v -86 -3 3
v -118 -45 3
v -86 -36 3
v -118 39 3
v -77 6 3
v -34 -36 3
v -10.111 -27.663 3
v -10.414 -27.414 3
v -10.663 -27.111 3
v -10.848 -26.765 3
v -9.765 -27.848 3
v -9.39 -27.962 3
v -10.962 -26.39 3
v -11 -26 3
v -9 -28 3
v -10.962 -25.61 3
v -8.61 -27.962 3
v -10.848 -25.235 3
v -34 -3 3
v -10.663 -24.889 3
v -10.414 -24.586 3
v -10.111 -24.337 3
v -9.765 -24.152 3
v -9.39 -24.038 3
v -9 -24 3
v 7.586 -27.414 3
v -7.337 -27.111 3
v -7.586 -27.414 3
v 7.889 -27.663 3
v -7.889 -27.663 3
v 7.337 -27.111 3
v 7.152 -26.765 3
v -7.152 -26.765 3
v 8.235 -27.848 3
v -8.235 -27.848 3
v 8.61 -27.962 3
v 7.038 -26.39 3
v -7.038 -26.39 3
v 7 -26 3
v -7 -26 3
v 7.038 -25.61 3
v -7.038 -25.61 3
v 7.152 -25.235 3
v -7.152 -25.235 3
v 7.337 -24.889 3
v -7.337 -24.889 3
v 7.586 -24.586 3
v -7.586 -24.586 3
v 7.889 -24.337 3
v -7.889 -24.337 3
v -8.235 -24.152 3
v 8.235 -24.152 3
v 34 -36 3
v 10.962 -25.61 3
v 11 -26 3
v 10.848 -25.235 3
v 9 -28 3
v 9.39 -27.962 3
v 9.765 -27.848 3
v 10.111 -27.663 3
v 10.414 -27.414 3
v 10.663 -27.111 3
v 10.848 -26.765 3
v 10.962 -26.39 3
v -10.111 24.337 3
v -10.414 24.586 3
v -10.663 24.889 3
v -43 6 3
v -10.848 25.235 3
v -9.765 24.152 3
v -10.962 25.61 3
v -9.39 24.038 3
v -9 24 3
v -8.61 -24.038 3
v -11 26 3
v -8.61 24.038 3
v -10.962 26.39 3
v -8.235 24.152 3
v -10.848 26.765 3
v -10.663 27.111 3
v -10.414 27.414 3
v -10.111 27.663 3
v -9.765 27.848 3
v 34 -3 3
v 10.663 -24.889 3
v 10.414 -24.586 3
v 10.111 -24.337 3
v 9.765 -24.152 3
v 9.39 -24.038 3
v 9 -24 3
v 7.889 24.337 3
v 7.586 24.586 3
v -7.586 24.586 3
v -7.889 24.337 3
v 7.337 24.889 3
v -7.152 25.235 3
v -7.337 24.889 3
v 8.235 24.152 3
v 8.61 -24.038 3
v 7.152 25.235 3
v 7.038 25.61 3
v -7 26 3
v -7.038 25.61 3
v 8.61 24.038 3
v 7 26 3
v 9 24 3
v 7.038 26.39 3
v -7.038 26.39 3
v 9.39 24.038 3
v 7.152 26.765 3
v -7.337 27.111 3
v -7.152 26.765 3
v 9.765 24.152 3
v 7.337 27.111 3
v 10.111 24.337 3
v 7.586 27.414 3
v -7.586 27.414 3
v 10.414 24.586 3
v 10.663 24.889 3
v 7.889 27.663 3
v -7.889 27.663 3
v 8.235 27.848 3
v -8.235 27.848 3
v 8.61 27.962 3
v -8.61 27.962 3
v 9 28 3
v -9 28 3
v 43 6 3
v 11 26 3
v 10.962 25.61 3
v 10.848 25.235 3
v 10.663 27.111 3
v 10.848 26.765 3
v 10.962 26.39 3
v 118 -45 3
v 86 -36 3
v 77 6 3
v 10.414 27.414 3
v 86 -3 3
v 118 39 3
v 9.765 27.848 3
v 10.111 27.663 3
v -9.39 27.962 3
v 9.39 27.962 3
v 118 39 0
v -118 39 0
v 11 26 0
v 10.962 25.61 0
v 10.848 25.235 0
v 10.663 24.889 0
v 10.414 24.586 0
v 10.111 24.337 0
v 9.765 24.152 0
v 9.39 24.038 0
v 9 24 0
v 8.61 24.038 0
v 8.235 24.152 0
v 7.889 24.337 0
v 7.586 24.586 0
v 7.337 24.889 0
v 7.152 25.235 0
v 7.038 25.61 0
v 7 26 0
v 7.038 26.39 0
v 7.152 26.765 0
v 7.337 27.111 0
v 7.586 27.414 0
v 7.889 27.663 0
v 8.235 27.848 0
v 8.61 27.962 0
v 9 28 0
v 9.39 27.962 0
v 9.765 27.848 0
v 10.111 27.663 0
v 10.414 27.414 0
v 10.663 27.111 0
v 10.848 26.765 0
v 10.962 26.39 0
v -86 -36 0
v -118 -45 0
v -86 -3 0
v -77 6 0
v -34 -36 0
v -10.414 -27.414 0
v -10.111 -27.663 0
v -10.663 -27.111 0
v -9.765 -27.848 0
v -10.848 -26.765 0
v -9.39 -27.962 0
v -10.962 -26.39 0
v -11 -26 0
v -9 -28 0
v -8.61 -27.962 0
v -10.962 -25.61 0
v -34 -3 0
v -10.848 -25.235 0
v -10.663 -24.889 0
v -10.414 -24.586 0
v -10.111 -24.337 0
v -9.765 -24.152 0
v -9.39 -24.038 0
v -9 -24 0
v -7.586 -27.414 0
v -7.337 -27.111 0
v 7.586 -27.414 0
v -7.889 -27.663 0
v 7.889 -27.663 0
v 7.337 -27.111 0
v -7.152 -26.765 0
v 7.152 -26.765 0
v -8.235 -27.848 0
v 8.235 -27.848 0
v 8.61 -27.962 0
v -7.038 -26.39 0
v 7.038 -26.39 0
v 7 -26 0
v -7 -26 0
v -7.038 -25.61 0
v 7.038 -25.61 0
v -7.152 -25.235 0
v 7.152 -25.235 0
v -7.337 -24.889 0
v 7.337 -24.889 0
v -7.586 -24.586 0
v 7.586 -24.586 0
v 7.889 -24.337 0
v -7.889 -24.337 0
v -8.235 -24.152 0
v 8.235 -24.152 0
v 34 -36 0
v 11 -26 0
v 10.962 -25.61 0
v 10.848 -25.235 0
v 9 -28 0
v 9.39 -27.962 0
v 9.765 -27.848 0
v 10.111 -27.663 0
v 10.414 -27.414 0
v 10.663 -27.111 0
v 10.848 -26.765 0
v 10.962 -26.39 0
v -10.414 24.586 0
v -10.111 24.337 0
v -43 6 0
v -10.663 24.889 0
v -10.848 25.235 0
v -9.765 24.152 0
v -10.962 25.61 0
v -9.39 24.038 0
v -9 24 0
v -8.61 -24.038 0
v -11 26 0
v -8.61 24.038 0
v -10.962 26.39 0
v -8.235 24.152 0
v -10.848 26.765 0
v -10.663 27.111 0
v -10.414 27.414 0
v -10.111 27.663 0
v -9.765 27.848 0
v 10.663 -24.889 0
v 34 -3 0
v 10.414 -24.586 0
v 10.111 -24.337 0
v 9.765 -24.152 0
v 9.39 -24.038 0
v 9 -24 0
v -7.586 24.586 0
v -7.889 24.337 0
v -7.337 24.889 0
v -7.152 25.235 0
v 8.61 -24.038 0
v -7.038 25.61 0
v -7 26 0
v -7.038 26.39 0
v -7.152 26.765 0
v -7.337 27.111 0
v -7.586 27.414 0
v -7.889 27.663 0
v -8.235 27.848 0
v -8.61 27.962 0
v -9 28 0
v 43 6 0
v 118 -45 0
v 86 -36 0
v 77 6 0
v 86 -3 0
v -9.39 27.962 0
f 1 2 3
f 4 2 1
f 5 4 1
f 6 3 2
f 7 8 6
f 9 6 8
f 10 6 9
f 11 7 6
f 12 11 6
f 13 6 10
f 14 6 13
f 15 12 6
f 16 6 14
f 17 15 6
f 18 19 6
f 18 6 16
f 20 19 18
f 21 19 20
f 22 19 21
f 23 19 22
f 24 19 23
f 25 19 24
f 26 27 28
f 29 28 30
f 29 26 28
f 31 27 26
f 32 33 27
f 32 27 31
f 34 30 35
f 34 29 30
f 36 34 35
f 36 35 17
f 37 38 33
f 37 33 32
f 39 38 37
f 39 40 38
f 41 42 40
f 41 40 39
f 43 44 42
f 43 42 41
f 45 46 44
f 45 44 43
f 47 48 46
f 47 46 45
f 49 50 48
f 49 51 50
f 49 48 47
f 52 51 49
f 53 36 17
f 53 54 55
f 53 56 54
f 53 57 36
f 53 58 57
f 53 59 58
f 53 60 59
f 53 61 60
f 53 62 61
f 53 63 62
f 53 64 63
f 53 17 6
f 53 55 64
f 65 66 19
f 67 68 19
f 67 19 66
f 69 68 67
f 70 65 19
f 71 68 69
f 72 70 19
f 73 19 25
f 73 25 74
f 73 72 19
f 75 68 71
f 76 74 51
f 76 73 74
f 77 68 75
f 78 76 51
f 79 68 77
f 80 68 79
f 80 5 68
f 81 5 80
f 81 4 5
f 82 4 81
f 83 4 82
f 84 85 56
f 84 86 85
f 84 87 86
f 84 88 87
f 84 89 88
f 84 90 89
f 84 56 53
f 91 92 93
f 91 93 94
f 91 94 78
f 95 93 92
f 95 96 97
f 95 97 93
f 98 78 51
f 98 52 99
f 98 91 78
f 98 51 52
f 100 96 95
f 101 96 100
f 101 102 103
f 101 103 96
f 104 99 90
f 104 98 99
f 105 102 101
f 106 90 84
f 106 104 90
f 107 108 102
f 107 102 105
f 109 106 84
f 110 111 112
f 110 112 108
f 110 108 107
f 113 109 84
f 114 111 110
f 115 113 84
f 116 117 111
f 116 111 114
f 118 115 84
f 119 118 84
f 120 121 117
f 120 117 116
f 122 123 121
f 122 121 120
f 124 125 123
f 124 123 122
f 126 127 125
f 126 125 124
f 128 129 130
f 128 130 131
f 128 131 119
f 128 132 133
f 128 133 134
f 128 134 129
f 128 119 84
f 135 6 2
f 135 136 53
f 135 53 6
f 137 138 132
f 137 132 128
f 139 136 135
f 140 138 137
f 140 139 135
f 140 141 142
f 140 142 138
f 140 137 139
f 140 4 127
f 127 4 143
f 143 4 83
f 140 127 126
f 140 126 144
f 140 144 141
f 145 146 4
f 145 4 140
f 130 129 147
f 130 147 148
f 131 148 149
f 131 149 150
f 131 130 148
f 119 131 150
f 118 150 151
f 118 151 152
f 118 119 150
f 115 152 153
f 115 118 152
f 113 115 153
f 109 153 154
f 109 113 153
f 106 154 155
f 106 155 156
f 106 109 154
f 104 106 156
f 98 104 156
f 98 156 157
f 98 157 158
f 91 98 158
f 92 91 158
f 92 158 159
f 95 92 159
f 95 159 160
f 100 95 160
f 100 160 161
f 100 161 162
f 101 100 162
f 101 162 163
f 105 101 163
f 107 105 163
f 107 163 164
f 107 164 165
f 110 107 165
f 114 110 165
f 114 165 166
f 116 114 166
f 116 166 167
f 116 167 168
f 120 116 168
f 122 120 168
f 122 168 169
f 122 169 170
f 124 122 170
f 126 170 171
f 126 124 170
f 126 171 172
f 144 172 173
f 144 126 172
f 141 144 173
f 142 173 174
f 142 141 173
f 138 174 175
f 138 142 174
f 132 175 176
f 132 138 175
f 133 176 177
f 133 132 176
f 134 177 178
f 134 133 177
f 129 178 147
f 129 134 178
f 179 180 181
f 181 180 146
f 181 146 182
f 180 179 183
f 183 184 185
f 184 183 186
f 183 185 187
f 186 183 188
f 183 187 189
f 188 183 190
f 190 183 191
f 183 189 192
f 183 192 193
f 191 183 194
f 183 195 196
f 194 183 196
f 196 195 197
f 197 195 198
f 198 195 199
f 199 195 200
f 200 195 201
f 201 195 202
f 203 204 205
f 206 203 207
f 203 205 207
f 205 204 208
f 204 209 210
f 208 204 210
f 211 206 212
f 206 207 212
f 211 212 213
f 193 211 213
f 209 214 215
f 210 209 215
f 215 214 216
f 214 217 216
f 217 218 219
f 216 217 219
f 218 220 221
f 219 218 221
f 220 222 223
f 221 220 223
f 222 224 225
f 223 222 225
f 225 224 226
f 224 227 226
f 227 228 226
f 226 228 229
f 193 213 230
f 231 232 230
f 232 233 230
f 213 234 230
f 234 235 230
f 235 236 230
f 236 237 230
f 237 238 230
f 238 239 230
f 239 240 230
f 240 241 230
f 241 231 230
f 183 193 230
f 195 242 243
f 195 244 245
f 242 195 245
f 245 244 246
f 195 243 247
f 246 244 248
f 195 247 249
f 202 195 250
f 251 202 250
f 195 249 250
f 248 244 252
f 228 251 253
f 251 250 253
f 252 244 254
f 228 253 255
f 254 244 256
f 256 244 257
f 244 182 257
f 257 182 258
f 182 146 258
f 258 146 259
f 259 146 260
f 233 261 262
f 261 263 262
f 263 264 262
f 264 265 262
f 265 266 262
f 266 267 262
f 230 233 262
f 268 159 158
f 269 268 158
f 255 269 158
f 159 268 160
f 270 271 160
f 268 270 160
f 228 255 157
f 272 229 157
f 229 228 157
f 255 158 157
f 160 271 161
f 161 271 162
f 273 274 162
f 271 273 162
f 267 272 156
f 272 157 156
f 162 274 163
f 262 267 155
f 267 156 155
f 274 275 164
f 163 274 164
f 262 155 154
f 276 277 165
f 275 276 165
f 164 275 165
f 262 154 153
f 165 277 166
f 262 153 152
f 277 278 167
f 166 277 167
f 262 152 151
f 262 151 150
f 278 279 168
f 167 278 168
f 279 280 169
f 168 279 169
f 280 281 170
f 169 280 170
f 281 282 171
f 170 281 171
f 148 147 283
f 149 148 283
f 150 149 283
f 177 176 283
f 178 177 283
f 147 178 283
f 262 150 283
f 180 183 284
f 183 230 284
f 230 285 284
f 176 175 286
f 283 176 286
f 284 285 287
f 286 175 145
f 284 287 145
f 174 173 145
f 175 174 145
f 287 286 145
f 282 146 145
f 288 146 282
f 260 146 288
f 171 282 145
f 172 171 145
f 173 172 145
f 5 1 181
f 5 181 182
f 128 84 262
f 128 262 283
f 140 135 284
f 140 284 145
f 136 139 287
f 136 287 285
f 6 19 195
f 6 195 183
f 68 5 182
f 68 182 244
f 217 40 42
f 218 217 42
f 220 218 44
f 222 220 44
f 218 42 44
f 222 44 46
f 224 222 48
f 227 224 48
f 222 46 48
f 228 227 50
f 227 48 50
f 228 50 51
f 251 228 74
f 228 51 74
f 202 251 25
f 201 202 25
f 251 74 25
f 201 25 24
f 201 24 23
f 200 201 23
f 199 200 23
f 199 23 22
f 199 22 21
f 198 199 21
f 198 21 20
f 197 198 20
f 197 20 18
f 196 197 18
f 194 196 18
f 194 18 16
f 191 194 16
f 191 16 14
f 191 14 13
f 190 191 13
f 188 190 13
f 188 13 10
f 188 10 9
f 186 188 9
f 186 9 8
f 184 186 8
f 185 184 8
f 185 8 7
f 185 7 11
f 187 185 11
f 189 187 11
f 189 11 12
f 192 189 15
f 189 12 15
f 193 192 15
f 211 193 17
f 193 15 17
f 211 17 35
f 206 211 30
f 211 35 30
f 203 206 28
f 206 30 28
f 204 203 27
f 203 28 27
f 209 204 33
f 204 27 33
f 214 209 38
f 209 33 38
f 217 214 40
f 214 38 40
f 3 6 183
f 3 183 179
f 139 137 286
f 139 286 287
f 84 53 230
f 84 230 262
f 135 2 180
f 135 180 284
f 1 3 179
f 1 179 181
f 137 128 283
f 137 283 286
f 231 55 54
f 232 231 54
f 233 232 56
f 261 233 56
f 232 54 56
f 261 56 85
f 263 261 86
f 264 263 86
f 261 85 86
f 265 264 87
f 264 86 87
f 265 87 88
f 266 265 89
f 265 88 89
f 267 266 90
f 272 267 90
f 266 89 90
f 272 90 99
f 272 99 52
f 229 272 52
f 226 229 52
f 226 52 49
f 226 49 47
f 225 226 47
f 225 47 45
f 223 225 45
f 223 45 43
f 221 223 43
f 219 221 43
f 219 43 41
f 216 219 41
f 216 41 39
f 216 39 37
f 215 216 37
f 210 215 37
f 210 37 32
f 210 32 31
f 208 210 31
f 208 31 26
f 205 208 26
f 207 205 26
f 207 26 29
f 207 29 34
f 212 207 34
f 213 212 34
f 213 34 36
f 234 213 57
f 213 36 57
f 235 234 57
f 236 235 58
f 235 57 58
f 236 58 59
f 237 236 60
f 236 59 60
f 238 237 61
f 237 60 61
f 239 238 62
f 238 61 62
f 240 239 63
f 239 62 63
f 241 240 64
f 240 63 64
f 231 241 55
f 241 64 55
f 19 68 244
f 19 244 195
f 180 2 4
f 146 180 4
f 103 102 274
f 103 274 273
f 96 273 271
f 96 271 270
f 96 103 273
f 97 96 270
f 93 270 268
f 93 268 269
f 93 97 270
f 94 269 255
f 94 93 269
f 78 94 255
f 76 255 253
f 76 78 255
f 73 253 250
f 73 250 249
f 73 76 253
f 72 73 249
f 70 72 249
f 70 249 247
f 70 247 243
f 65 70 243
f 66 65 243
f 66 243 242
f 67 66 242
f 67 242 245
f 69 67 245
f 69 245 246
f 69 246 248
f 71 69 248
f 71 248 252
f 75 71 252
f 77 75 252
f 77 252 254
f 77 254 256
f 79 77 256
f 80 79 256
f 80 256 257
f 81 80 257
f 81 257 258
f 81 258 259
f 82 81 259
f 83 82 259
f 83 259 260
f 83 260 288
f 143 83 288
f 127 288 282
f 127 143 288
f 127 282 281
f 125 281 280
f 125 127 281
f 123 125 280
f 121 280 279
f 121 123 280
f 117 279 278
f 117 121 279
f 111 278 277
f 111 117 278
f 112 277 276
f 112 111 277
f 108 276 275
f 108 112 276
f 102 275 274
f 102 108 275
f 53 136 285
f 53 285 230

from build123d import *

# Parameters (mm, degrees)
ESQUISSE1_W             = 236
ESQUISSE1_H             = 78
BOSS_EXTRU_1_DEPTH      = 3
ENL_V_MAT_EXTRU_1_REACH = 126.314
ESQUISSE2_R             = 2
ESQUISSE3_W             = 236
ESQUISSE3_H             = 6
BOSS_EXTRU_2_DEPTH      = 3
ENL_V_MAT_EXTRU_2_REACH = 128.325


with BuildPart() as part:
    # Esquisse1 → Boss.-Extru.1 (new body)
    with BuildSketch(Plane.XY):
        Rectangle(ESQUISSE1_W, ESQUISSE1_H)
    extrude(amount=BOSS_EXTRU_1_DEPTH)

    # Esquisse2 → Enlèv. mat.-Extru.1 (cut, up to next)
    with BuildSketch(Plane.XY.offset(3), mode=Mode.PRIVATE) as enl_v_mat_extru_1_sk1:
        with Locations((9, -26)):
            Circle(ESQUISSE2_R)
    enl_v_mat_extru_1_tool1 = extrude(enl_v_mat_extru_1_sk1.sketch, amount=-ENL_V_MAT_EXTRU_1_REACH, mode=Mode.PRIVATE) & part.part
    # Esquisse2 → Enlèv. mat.-Extru.1 (cut, up to next)
    with BuildSketch(Plane.XY.offset(3), mode=Mode.PRIVATE) as enl_v_mat_extru_1_sk2:
        with Locations((-9, -26)):
            Circle(ESQUISSE2_R)
    enl_v_mat_extru_1_tool2 = extrude(enl_v_mat_extru_1_sk2.sketch, amount=-ENL_V_MAT_EXTRU_1_REACH, mode=Mode.PRIVATE) & part.part
    enl_v_mat_extru_1_1 = enl_v_mat_extru_1_tool1.solids().sort_by_distance((9, -26, 3))[0]
    add(enl_v_mat_extru_1_1, mode=Mode.SUBTRACT)
    enl_v_mat_extru_1_2 = enl_v_mat_extru_1_tool2.solids().sort_by_distance((-9, -26, 3))[0]
    add(enl_v_mat_extru_1_2, mode=Mode.SUBTRACT)
    enl_v_mat_extru_1 = enl_v_mat_extru_1_1 + enl_v_mat_extru_1_2  # Enlèv. mat.-Extru.1 as one shape, for the pattern or mirror that repeats it

    # Symétrie1: Enlèv. mat.-Extru.1 across plane
    add(enl_v_mat_extru_1.mirror(Plane.ZX), mode=Mode.SUBTRACT)

    # Esquisse3 → Boss.-Extru.2 (add)
    with BuildSketch(Plane.XY.offset(3)):
        with Locations((0, -42)):
            Rectangle(ESQUISSE3_W, ESQUISSE3_H)
    extrude(amount=-BOSS_EXTRU_2_DEPTH)

    # Esquisse4 → Enlèv. mat.-Extru.2 (cut, up to next)
    with BuildSketch(Plane.XY.offset(3), mode=Mode.PRIVATE) as enl_v_mat_extru_2_sk1:
        Polygon((34, -36), (34, -3), (43, 6), (77, 6), (86, -3), (86, -36), align=None)
    enl_v_mat_extru_2_tool1 = extrude(enl_v_mat_extru_2_sk1.sketch, amount=-ENL_V_MAT_EXTRU_2_REACH, mode=Mode.PRIVATE) & part.part
    # Esquisse4 → Enlèv. mat.-Extru.2 (cut, up to next)
    with BuildSketch(Plane.XY.offset(3), mode=Mode.PRIVATE) as enl_v_mat_extru_2_sk2:
        Polygon((-86, -3), (-77, 6), (-43, 6), (-34, -3), (-34, -36), (-86, -36), align=None)
    enl_v_mat_extru_2_tool2 = extrude(enl_v_mat_extru_2_sk2.sketch, amount=-ENL_V_MAT_EXTRU_2_REACH, mode=Mode.PRIVATE) & part.part
    add(enl_v_mat_extru_2_tool1.solids().sort_by_distance((60, -15.693295, 3))[0], mode=Mode.SUBTRACT)
    add(enl_v_mat_extru_2_tool2.solids().sort_by_distance((-60, -15.693295, 3))[0], mode=Mode.SUBTRACT)


solid = part.part
